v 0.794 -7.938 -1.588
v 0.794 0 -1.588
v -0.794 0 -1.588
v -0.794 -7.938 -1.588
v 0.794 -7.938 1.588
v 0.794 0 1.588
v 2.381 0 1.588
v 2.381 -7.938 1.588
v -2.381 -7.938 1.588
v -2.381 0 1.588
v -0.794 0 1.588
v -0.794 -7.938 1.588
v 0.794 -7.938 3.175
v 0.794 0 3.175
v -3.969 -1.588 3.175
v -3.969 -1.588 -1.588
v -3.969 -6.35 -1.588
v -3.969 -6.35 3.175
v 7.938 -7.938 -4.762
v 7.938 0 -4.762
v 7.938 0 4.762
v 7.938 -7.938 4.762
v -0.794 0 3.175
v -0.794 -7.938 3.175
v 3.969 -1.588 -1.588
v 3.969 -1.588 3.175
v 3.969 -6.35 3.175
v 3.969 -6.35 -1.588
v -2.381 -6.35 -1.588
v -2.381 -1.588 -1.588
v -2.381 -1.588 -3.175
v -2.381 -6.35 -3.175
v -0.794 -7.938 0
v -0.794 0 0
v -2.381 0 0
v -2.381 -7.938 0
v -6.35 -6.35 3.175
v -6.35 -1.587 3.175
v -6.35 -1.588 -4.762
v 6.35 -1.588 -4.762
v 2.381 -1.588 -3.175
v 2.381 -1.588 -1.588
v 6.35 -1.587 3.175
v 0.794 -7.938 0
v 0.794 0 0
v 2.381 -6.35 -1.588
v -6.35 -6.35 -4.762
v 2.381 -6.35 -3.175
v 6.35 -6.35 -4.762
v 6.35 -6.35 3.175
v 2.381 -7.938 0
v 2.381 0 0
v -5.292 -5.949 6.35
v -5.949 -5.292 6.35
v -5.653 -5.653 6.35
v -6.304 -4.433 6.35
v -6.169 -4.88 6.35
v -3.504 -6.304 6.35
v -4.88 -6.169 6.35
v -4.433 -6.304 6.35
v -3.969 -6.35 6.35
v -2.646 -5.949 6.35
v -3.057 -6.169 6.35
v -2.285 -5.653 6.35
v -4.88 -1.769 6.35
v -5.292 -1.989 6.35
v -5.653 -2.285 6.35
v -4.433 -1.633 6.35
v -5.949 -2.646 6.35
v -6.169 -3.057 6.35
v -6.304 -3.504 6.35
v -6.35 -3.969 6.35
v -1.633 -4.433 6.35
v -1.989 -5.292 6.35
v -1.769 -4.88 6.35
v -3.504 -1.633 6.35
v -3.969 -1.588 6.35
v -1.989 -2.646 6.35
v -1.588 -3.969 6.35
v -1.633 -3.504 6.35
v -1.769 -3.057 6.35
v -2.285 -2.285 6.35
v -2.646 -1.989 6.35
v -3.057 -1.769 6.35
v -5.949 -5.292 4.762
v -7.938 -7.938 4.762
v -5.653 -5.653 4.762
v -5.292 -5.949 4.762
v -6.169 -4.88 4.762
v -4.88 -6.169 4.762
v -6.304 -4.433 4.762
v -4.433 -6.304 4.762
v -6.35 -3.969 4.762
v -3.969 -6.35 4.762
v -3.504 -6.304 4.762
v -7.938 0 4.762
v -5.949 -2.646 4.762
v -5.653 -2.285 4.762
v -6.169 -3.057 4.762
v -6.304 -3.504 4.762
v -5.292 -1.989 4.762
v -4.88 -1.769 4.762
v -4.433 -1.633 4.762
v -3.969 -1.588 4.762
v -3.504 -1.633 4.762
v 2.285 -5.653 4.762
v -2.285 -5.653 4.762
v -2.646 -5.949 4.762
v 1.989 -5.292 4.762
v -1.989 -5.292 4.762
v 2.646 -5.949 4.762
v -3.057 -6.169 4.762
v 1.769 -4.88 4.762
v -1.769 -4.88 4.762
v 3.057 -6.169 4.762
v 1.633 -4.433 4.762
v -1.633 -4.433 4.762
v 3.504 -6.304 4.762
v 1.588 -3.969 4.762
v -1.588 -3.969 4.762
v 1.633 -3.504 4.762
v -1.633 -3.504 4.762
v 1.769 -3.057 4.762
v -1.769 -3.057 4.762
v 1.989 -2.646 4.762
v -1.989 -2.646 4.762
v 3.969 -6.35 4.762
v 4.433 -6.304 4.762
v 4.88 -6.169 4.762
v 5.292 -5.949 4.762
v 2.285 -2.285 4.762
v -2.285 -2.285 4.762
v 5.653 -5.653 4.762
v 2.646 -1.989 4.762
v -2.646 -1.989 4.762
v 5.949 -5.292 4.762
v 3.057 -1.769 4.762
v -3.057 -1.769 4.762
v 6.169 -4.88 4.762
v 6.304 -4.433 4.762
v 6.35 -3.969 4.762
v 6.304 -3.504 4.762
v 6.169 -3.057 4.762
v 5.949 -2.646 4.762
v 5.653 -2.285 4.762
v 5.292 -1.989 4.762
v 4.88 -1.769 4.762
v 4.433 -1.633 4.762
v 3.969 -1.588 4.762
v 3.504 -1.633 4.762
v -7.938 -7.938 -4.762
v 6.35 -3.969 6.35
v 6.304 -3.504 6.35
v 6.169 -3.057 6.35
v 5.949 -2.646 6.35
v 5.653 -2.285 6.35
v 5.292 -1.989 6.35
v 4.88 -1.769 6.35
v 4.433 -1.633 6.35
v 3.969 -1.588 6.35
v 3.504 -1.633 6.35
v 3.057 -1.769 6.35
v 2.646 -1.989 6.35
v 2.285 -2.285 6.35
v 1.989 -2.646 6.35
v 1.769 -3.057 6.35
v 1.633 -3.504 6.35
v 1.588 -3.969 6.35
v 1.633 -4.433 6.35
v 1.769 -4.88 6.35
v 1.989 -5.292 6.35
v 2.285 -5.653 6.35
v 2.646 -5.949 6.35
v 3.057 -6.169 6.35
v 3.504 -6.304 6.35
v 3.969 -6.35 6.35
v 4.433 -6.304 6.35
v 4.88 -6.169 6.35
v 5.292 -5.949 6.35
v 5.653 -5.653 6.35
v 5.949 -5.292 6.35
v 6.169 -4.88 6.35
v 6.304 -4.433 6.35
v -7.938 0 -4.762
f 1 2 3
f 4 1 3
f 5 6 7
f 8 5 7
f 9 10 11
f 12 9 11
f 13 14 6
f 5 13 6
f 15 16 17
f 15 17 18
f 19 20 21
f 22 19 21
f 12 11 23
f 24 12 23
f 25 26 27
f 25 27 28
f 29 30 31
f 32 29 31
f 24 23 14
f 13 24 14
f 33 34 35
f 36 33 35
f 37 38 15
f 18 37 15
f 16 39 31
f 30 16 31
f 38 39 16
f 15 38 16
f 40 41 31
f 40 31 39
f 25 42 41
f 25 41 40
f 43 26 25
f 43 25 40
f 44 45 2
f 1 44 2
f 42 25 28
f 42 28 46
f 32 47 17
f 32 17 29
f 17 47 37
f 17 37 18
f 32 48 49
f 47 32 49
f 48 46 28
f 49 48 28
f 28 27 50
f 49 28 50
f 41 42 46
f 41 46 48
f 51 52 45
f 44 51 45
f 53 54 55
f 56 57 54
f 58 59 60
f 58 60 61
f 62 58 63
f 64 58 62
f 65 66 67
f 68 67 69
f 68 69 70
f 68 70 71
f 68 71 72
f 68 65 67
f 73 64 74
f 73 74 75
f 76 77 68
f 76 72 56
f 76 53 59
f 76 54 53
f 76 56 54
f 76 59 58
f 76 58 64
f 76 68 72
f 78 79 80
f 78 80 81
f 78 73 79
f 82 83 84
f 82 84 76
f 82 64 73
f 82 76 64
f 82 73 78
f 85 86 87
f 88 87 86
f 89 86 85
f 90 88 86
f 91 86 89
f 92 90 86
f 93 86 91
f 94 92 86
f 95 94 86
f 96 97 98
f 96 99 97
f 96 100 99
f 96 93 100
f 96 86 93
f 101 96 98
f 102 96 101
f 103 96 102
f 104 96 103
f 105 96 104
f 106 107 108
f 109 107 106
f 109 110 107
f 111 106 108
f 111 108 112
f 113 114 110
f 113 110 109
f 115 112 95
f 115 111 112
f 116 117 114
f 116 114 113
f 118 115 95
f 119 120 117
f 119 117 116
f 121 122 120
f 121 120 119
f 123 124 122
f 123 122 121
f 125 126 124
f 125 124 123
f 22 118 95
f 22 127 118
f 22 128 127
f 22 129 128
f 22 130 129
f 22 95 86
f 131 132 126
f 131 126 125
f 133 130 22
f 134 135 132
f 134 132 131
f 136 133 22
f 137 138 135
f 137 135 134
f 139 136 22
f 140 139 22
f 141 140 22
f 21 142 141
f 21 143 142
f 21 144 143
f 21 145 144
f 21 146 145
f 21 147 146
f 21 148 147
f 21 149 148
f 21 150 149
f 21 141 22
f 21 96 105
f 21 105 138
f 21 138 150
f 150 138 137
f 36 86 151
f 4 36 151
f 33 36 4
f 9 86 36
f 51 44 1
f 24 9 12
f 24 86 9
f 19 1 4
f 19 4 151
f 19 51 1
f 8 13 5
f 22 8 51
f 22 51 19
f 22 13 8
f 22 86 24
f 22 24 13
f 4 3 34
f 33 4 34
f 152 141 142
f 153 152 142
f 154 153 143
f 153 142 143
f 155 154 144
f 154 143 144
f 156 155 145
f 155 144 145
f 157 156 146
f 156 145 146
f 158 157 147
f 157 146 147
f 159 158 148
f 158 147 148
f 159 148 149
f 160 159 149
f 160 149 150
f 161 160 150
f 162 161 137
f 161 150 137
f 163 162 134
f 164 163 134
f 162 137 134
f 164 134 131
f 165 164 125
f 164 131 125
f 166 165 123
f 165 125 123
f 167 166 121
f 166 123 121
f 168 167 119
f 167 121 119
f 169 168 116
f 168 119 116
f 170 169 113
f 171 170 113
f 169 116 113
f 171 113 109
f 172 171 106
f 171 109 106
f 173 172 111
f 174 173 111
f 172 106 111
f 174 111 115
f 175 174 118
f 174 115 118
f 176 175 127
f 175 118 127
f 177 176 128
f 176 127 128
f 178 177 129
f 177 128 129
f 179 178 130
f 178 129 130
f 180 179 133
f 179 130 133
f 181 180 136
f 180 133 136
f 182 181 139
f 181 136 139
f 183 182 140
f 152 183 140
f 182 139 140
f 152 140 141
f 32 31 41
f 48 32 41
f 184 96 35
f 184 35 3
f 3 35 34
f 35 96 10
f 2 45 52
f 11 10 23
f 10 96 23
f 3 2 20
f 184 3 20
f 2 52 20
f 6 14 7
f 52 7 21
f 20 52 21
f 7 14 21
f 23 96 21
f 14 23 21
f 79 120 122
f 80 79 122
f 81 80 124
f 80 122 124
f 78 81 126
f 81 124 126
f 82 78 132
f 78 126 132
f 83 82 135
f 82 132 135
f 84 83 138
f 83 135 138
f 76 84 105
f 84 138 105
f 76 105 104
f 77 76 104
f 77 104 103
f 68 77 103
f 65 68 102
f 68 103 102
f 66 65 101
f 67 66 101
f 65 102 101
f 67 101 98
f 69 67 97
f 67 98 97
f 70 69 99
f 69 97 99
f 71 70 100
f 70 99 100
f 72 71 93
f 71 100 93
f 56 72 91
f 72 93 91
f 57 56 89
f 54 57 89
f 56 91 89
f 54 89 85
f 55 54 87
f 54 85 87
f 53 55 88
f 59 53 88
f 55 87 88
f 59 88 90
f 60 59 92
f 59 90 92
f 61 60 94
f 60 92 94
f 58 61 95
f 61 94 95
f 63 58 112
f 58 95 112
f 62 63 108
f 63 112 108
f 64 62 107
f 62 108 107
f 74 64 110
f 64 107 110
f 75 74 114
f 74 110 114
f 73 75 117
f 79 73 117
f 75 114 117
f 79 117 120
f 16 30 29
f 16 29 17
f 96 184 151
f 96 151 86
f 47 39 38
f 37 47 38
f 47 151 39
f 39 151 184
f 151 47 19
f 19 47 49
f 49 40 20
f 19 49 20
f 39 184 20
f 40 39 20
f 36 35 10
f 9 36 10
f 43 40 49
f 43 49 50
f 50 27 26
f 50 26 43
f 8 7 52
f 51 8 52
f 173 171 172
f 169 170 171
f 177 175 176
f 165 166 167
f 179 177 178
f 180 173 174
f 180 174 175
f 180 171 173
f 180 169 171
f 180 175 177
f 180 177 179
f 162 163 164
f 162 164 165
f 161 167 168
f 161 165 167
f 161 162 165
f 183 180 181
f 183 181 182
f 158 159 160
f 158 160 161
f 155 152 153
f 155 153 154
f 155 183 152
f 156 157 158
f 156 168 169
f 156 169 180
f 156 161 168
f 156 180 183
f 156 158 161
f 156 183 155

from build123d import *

# Parameters (mm, degrees)
F0_W        = 15.875
F0_H        = 9.525
F1_DEPTH    = 7.9375
F2_T        = 1.5875
F2_T3_DEPTH = 11.1125
F3_R        = 2.38125
F4_DEPTH    = 1.5875


# Not quite as in the source:
# - a shell that OpenCascade refuses in one call is made with other operations: the cavity is built on its own and cut out


with BuildPart() as f1:
    # F0 (on Front) → F1 (new body)
    with BuildSketch(Plane.XZ):
        Rectangle(F0_W, F0_H)
        Polygon((-0.79375, 1.5875), (-0.79375, 3.175), (0.79375, 3.175), (0.79375, 1.5875), (2.38125, 1.5875), (2.38125, 0), (0.79375, 0), (0.79375, -1.5875), (-0.79375, -1.5875), (-0.79375, 0), (-2.38125, 0), (-2.38125, 1.5875), align=None, mode=Mode.SUBTRACT)
    extrude(amount=F1_DEPTH)

    # F2: shell of thickness 1.5875, made by hand


with BuildPart() as f2_core1:
    # F2_t2: copy of F1
    add(f1.part)

    # the walls: a layer under each face that stays
    f2_faces = [f2_core1.faces().sort_by_distance(p)[0] for p in [
        (0, -3.96875, 4.7625),
        (-7.9375, -3.96875, 0),
        (7.9375, -3.96875, 0),
        (-0.79375, -3.96875, -0.79375),
        (-1.5875, -3.96875, 0),
        (-2.38125, -3.96875, 0.79375),
        (-1.5875, -3.96875, 1.5875),
        (-0.79375, -3.96875, 2.38125),
        (0, -3.96875, 3.175),
        (0.79375, -3.96875, 2.38125),
        (1.5875, -3.96875, 1.5875),
        (2.38125, -3.96875, 0.79375),
        (1.5875, -3.96875, 0),
        (0.79375, -3.96875, -0.79375),
        (0, -3.96875, -1.5875),
        (-5.2916666667, 0, -3.175),
        (-5.2916666667, -7.9375, -3.175),
    ]]
    thicken(f2_faces, amount=-F2_T, mode=Mode.SUBTRACT)

    # F2_s4 → F2_t3 (cut)
    with BuildSketch(Plane.XZ.offset(-1.5875)):
        Polygon((-0.777875, -1.571625), (-2.38125, -1.5875), (-2.38125, -3.175), (-0.79375, -3.175), align=None)
        Polygon((-2.365375, 0.015875), (-2.38125, -1.5875), (-3.96875, -1.5875), (-3.96875, 0), align=None)
        Polygon((-2.365375, 1.571625), (-3.96875, 1.5875), (-3.96875, 3.175), (-2.38125, 3.175), align=None)
        Polygon((-0.777875, 3.159125), (-2.38125, 3.175), (-2.38125, 4.7625), (-0.79375, 4.7625), align=None)
        Polygon((0.777875, 3.159125), (0.79375, 4.7625), (2.38125, 4.7625), (2.38125, 3.175), align=None)
        Polygon((2.365375, 1.571625), (2.38125, 3.175), (3.96875, 3.175), (3.96875, 1.5875), align=None)
        Polygon((2.365375, 0.015875), (3.96875, 0), (3.96875, -1.5875), (2.38125, -1.5875), align=None)
        Polygon((0.777875, -1.571625), (2.38125, -1.5875), (2.38125, -3.175), (0.79375, -3.175), align=None)
    extrude(amount=F2_T3_DEPTH, mode=Mode.SUBTRACT)


with BuildPart() as f1_1:
    add(f1.part)

    # what is left inside the walls is the cavity
    f2_cavity = [f2_core1.part.solids().sort_by_distance(p)[0] for p in [
        (0, -4.7625, -4.746625),
    ]]
    add(f2_cavity, mode=Mode.SUBTRACT)

    # F3 (on face) → F4 (join)
    with BuildSketch(Plane.XY.offset(4.7625)):
        with Locations((-3.96875, -3.96875)):
            Circle(F3_R)
        with Locations((3.96875, -3.96875)):
            Circle(F3_R)
    extrude(amount=F4_DEPTH)


solid = f1_1.part
